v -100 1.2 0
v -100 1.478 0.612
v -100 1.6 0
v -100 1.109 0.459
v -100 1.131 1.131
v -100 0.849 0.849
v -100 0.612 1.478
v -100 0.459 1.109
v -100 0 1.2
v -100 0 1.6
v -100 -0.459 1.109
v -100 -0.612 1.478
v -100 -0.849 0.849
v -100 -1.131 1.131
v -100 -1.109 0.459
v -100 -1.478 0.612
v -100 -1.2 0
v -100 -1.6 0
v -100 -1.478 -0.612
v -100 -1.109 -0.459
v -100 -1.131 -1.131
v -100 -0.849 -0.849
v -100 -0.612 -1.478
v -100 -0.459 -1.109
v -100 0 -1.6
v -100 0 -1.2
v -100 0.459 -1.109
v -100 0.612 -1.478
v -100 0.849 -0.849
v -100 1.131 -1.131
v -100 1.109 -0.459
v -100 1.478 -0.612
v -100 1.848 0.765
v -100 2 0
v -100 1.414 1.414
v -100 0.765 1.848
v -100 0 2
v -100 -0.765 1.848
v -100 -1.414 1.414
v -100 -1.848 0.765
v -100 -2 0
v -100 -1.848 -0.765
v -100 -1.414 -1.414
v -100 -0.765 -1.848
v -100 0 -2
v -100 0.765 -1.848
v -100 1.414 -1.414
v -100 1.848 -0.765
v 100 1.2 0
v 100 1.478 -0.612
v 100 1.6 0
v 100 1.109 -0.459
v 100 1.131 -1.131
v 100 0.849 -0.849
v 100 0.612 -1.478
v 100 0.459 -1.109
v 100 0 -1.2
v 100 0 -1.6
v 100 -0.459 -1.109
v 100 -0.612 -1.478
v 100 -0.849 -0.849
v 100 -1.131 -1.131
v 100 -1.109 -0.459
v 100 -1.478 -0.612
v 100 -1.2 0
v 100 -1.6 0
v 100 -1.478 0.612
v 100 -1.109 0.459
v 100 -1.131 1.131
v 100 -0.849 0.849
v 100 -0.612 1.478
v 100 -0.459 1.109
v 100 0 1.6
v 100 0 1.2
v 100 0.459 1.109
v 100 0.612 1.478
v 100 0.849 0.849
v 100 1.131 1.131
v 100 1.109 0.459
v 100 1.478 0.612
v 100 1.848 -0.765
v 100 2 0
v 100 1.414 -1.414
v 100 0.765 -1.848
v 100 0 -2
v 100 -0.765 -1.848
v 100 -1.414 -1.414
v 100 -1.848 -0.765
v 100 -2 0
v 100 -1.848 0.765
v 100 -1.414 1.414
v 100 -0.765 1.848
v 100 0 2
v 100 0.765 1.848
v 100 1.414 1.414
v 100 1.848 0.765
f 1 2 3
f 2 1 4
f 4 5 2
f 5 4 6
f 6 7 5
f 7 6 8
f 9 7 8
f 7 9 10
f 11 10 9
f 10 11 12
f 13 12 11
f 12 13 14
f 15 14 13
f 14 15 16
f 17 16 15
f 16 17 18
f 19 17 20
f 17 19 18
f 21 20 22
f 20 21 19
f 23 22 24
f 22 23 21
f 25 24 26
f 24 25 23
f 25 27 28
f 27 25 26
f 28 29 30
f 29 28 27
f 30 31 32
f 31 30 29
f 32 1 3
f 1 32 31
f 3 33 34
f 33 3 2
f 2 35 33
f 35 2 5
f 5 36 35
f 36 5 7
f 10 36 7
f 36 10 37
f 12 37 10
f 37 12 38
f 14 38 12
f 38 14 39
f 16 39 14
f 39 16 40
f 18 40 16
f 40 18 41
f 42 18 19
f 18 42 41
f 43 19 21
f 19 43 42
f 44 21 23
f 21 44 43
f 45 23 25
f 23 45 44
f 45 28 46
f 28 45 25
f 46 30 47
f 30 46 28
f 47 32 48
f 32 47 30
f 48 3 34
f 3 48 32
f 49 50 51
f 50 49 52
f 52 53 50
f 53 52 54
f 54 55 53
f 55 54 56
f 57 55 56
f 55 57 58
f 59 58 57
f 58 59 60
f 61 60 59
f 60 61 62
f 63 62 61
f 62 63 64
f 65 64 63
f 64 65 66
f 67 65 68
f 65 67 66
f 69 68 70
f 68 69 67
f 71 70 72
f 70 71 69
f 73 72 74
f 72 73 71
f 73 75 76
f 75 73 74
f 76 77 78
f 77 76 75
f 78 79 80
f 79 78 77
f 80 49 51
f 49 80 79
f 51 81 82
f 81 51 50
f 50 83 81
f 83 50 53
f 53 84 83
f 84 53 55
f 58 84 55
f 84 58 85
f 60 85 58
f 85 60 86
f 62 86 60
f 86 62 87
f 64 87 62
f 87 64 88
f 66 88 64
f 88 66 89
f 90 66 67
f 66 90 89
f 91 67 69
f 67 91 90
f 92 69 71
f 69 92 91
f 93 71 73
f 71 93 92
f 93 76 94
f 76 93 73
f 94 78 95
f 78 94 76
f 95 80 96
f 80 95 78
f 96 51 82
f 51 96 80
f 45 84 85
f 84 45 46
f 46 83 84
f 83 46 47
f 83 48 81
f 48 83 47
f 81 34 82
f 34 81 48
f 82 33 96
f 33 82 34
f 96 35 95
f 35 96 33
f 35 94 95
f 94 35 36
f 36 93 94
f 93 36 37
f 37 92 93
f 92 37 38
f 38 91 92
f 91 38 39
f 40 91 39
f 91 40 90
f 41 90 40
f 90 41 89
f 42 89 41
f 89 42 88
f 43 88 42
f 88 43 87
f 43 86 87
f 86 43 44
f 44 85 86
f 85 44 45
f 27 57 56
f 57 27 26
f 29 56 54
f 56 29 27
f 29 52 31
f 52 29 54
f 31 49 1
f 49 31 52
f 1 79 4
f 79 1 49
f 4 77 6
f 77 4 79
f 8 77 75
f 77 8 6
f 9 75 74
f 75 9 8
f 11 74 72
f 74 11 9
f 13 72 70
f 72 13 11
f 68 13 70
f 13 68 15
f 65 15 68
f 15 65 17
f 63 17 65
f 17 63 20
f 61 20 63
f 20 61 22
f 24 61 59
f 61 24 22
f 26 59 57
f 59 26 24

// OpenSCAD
// file: ../p/4-4cyli.scad
use <../lib.scad>
function ldraw_lib__4_4cyli() = [
// 0 Cylinder 1.0
// 0 Name: 4-4cyli.dat
// 0 Author: James Jessiman
// 0 !LDRAW_ORG Primitive UPDATE 2005-01
// 0 !LICENSE Licensed under CC BY 4.0 : see CAreadme.txt
// 
// 0 BFC CERTIFY CCW
  [0,"BFC","CERTIFY"],
  [0,"BFC","CCW"],
// 
// 0 !HISTORY 1998-12-15 [PTadmin] Official Update 1998-10
// 0 !HISTORY 2002-03-23 [sbliss] Added BFC statement; merged headers from files in distributions LDraw 0.27 and Complete.
// 0 !HISTORY 2002-04-25 [PTadmin] Official Update 2002-02
// 0 !HISTORY 2004-12-14 [guyvivan] BFC CCW
// 0 !HISTORY 2005-12-28 [PTadmin] Official Update 2005-01
// 0 !HISTORY 2007-06-24 [PTadmin] Header formatted for Contributor Agreement
// 0 !HISTORY 2008-07-01 [PTadmin] Official Update 2008-01
// 
// 
// 4 16 1 1 0 0.9239 1 0.3827 0.9239 0 0.3827 1 0 0
  [4,16,1,1,0,0.9239,1,0.3827,0.9239,0,0.3827,1,0,0],
// 5 24 1 0 0 1 1 0 0.9239 0 0.3827 0.9239 0 -0.3827
  [5,24,1,0,0,1,1,0,0.9239,0,0.3827,0.9239,0,-0.3827],
// 4 16 0.9239 1 0.3827 0.7071 1 0.7071 0.7071 0 0.7071 0.9239 0 0.3827
  [4,16,0.9239,1,0.3827,0.7071,1,0.7071,0.7071,0,0.7071,0.9239,0,0.3827],
// 5 24 0.9239 0 0.3827 0.9239 1 0.3827 0.7071 0 0.7071 1 0 0
  [5,24,0.9239,0,0.3827,0.9239,1,0.3827,0.7071,0,0.7071,1,0,0],
// 4 16 0.7071 1 0.7071 0.3827 1 0.9239 0.3827 0 0.9239 0.7071 0 0.7071
  [4,16,0.7071,1,0.7071,0.3827,1,0.9239,0.3827,0,0.9239,0.7071,0,0.7071],
// 5 24 0.7071 0 0.7071 0.7071 1 0.7071 0.3827 0 0.9239 0.9239 0 0.3827
  [5,24,0.7071,0,0.7071,0.7071,1,0.7071,0.3827,0,0.9239,0.9239,0,0.3827],
// 4 16 0.3827 1 0.9239 0 1 1 0 0 1 0.3827 0 0.9239
  [4,16,0.3827,1,0.9239,0,1,1,0,0,1,0.3827,0,0.9239],
// 5 24 0.3827 0 0.9239 0.3827 1 0.9239 0 0 1 0.7071 0 0.7071
  [5,24,0.3827,0,0.9239,0.3827,1,0.9239,0,0,1,0.7071,0,0.7071],
// 4 16 0 1 1 -0.3827 1 0.9239 -0.3827 0 0.9239 0 0 1
  [4,16,0,1,1,-0.3827,1,0.9239,-0.3827,0,0.9239,0,0,1],
// 5 24 0 0 1 0 1 1 -0.3827 0 0.9239 0.3827 0 0.9239
  [5,24,0,0,1,0,1,1,-0.3827,0,0.9239,0.3827,0,0.9239],
// 4 16 -0.3827 1 0.9239 -0.7071 1 0.7071 -0.7071 0 0.7071 -0.3827 0 0.9239
  [4,16,-0.3827,1,0.9239,-0.7071,1,0.7071,-0.7071,0,0.7071,-0.3827,0,0.9239],
// 5 24 -0.3827 0 0.9239 -0.3827 1 0.9239 -0.7071 0 0.7071 0 0 1
  [5,24,-0.3827,0,0.9239,-0.3827,1,0.9239,-0.7071,0,0.7071,0,0,1],
// 4 16 -0.7071 1 0.7071 -0.9239 1 0.3827 -0.9239 0 0.3827 -0.7071 0 0.7071
  [4,16,-0.7071,1,0.7071,-0.9239,1,0.3827,-0.9239,0,0.3827,-0.7071,0,0.7071],
// 5 24 -0.7071 0 0.7071 -0.7071 1 0.7071 -0.9239 0 0.3827 -0.3827 0 0.9239
  [5,24,-0.7071,0,0.7071,-0.7071,1,0.7071,-0.9239,0,0.3827,-0.3827,0,0.9239],
// 4 16 -0.9239 1 0.3827 -1 1 0 -1 0 0 -0.9239 0 0.3827
  [4,16,-0.9239,1,0.3827,-1,1,0,-1,0,0,-0.9239,0,0.3827],
// 5 24 -0.9239 0 0.3827 -0.9239 1 0.3827 -1 0 0 -0.7071 0 0.7071
  [5,24,-0.9239,0,0.3827,-0.9239,1,0.3827,-1,0,0,-0.7071,0,0.7071],
// 4 16 -1 1 0 -0.9239 1 -0.3827 -0.9239 0 -0.3827 -1 0 0
  [4,16,-1,1,0,-0.9239,1,-0.3827,-0.9239,0,-0.3827,-1,0,0],
// 5 24 -1 0 0 -1 1 0 -0.9239 0 -0.3827 -0.9239 0 0.3827
  [5,24,-1,0,0,-1,1,0,-0.9239,0,-0.3827,-0.9239,0,0.3827],
// 4 16 -0.9239 1 -0.3827 -0.7071 1 -0.7071 -0.7071 0 -0.7071 -0.9239 0 -0.3827
  [4,16,-0.9239,1,-0.3827,-0.7071,1,-0.7071,-0.7071,0,-0.7071,-0.9239,0,-0.3827],
// 5 24 -0.9239 0 -0.3827 -0.9239 1 -0.3827 -0.7071 0 -0.7071 -1 0 0
  [5,24,-0.9239,0,-0.3827,-0.9239,1,-0.3827,-0.7071,0,-0.7071,-1,0,0],
// 4 16 -0.7071 1 -0.7071 -0.3827 1 -0.9239 -0.3827 0 -0.9239 -0.7071 0 -0.7071
  [4,16,-0.7071,1,-0.7071,-0.3827,1,-0.9239,-0.3827,0,-0.9239,-0.7071,0,-0.7071],
// 5 24 -0.7071 0 -0.7071 -0.7071 1 -0.7071 -0.3827 0 -0.9239 -0.9239 0 -0.3827
  [5,24,-0.7071,0,-0.7071,-0.7071,1,-0.7071,-0.3827,0,-0.9239,-0.9239,0,-0.3827],
// 4 16 -0.3827 1 -0.9239 0 1 -1 0 0 -1 -0.3827 0 -0.9239
  [4,16,-0.3827,1,-0.9239,0,1,-1,0,0,-1,-0.3827,0,-0.9239],
// 5 24 -0.3827 0 -0.9239 -0.3827 1 -0.9239 0 0 -1 -0.7071 0 -0.7071
  [5,24,-0.3827,0,-0.9239,-0.3827,1,-0.9239,0,0,-1,-0.7071,0,-0.7071],
// 4 16 0 1 -1 0.3827 1 -0.9239 0.3827 0 -0.9239 0 0 -1
  [4,16,0,1,-1,0.3827,1,-0.9239,0.3827,0,-0.9239,0,0,-1],
// 5 24 0 0 -1 0 1 -1 0.3827 0 -0.9239 -0.3827 0 -0.9239
  [5,24,0,0,-1,0,1,-1,0.3827,0,-0.9239,-0.3827,0,-0.9239],
// 4 16 0.3827 1 -0.9239 0.7071 1 -0.7071 0.7071 0 -0.7071 0.3827 0 -0.9239
  [4,16,0.3827,1,-0.9239,0.7071,1,-0.7071,0.7071,0,-0.7071,0.3827,0,-0.9239],
// 5 24 0.3827 0 -0.9239 0.3827 1 -0.9239 0.7071 0 -0.7071 0 0 -1
  [5,24,0.3827,0,-0.9239,0.3827,1,-0.9239,0.7071,0,-0.7071,0,0,-1],
// 4 16 0.7071 1 -0.7071 0.9239 1 -0.3827 0.9239 0 -0.3827 0.7071 0 -0.7071
  [4,16,0.7071,1,-0.7071,0.9239,1,-0.3827,0.9239,0,-0.3827,0.7071,0,-0.7071],
// 5 24 0.7071 0 -0.7071 0.7071 1 -0.7071 0.9239 0 -0.3827 0.3827 0 -0.9239
  [5,24,0.7071,0,-0.7071,0.7071,1,-0.7071,0.9239,0,-0.3827,0.3827,0,-0.9239],
// 4 16 0.9239 1 -0.3827 1 1 0 1 0 0 0.9239 0 -0.3827
  [4,16,0.9239,1,-0.3827,1,1,0,1,0,0,0.9239,0,-0.3827],
// 5 24 0.9239 0 -0.3827 0.9239 1 -0.3827 1 0 0 0.7071 0 -0.7071
  [5,24,0.9239,0,-0.3827,0.9239,1,-0.3827,1,0,0,0.7071,0,-0.7071],
// 0
];
module ldraw_lib__4_4cyli(step=0, col=false, unit=2/5, alt=false, line=0.2, solid=!$preview)
    makepoly(ldraw_lib__4_4cyli(), step=step, col=col, unit=unit, alt=alt, line=line, solid=solid);
ldraw_lib__4_4cyli(line=0.2);
// file: ../p/4-4ring4.scad
use <../lib.scad>
function ldraw_lib__4_4ring4() = [
// 0 Ring  4 x 1.0
// 0 Name: 4-4ring4.dat
// 0 Author: James Jessiman
// 0 !LDRAW_ORG Primitive UPDATE 2009-01
// 0 !LICENSE Licensed under CC BY 4.0 : see CAreadme.txt
// 
// 0 BFC CERTIFY CCW
  [0,"BFC","CERTIFY"],
  [0,"BFC","CCW"],
// 
// 0 !HISTORY 1998-12-15 [PTadmin] Official Update 1998-10
// 0 !HISTORY 2002-04-08 [BrickCaster] Modified for BFC compliance
// 0 !HISTORY 2002-04-25 [PTadmin] Official Update 2002-02
// 0 !HISTORY 2007-06-24 [PTadmin] Header formatted for Contributor Agreement
// 0 !HISTORY 2008-07-01 [PTadmin] Official Update 2008-01
// 0 !HISTORY 2008-08-26 [cwdee] Switch polygon winding and rename
// 0 !HISTORY 2009-05-02 [PTadmin] Official Update 2009-01
// 
// 
// 4 16 -1.9135 0 4.6195 -1.5308 0 3.6956 0 0 4 0 0 5
  [4,16,-1.9135,0,4.6195,-1.5308,0,3.6956,0,0,4,0,0,5],
// 4 16 -3.5355 0 3.5355 -2.8284 0 2.8284 -1.5308 0 3.6956 -1.9135 0 4.6195
  [4,16,-3.5355,0,3.5355,-2.8284,0,2.8284,-1.5308,0,3.6956,-1.9135,0,4.6195],
// 4 16 -4.6195 0 1.9135 -3.6956 0 1.5308 -2.8284 0 2.8284 -3.5355 0 3.5355
  [4,16,-4.6195,0,1.9135,-3.6956,0,1.5308,-2.8284,0,2.8284,-3.5355,0,3.5355],
// 4 16 -5 0 0 -4 0 0 -3.6956 0 1.5308 -4.6195 0 1.9135
  [4,16,-5,0,0,-4,0,0,-3.6956,0,1.5308,-4.6195,0,1.9135],
// 4 16 -4.6195 0 -1.9135 -3.6956 0 -1.5308 -4 0 0 -5 0 0
  [4,16,-4.6195,0,-1.9135,-3.6956,0,-1.5308,-4,0,0,-5,0,0],
// 4 16 -3.5355 0 -3.5355 -2.8284 0 -2.8284 -3.6956 0 -1.5308 -4.6195 0 -1.9135
  [4,16,-3.5355,0,-3.5355,-2.8284,0,-2.8284,-3.6956,0,-1.5308,-4.6195,0,-1.9135],
// 4 16 -1.9135 0 -4.6195 -1.5308 0 -3.6956 -2.8284 0 -2.8284 -3.5355 0 -3.5355
  [4,16,-1.9135,0,-4.6195,-1.5308,0,-3.6956,-2.8284,0,-2.8284,-3.5355,0,-3.5355],
// 4 16 0 0 -5 0 0 -4 -1.5308 0 -3.6956 -1.9135 0 -4.6195
  [4,16,0,0,-5,0,0,-4,-1.5308,0,-3.6956,-1.9135,0,-4.6195],
// 4 16 1.9135 0 -4.6195 1.5308 0 -3.6956 0 0 -4 0 0 -5
  [4,16,1.9135,0,-4.6195,1.5308,0,-3.6956,0,0,-4,0,0,-5],
// 4 16 3.5355 0 -3.5355 2.8284 0 -2.8284 1.5308 0 -3.6956 1.9135 0 -4.6195
  [4,16,3.5355,0,-3.5355,2.8284,0,-2.8284,1.5308,0,-3.6956,1.9135,0,-4.6195],
// 4 16 4.6195 0 -1.9135 3.6956 0 -1.5308 2.8284 0 -2.8284 3.5355 0 -3.5355
  [4,16,4.6195,0,-1.9135,3.6956,0,-1.5308,2.8284,0,-2.8284,3.5355,0,-3.5355],
// 4 16 5 0 0 4 0 0 3.6956 0 -1.5308 4.6195 0 -1.9135
  [4,16,5,0,0,4,0,0,3.6956,0,-1.5308,4.6195,0,-1.9135],
// 4 16 4.6195 0 1.9135 3.6956 0 1.5308 4 0 0 5 0 0
  [4,16,4.6195,0,1.9135,3.6956,0,1.5308,4,0,0,5,0,0],
// 4 16 3.5355 0 3.5355 2.8284 0 2.8284 3.6956 0 1.5308 4.6195 0 1.9135
  [4,16,3.5355,0,3.5355,2.8284,0,2.8284,3.6956,0,1.5308,4.6195,0,1.9135],
// 4 16 1.9135 0 4.6195 1.5308 0 3.6956 2.8284 0 2.8284 3.5355 0 3.5355
  [4,16,1.9135,0,4.6195,1.5308,0,3.6956,2.8284,0,2.8284,3.5355,0,3.5355],
// 4 16 0 0 5 0 0 4 1.5308 0 3.6956 1.9135 0 4.6195
  [4,16,0,0,5,0,0,4,1.5308,0,3.6956,1.9135,0,4.6195],
// 0
];
module ldraw_lib__4_4ring4(step=0, col=false, unit=2/5, alt=false, line=0.2, solid=!$preview)
    makepoly(ldraw_lib__4_4ring4(), step=step, col=col, unit=unit, alt=alt, line=line, solid=solid);
ldraw_lib__4_4ring4(line=0.2);
// file: ../p/4-4ring3.scad
use <../lib.scad>
function ldraw_lib__4_4ring3() = [
// 0 Ring  3 x 1.0
// 0 Name: 4-4ring3.dat
// 0 Author: James Jessiman
// 0 !LDRAW_ORG Primitive UPDATE 2009-01
// 0 !LICENSE Licensed under CC BY 4.0 : see CAreadme.txt
// 
// 0 BFC CERTIFY CCW
  [0,"BFC","CERTIFY"],
  [0,"BFC","CCW"],
// 
// 0 !HISTORY 1998-12-15 [PTadmin] Official Update 1998-10
// 0 !HISTORY 2002-04-05 [hafhead] Added BFC statement
// 0 !HISTORY 2002-04-25 [PTadmin] Official Update 2002-02
// 0 !HISTORY 2007-06-24 [PTadmin] Header formatted for Contributor Agreement
// 0 !HISTORY 2008-07-01 [PTadmin] Official Update 2008-01
// 0 !HISTORY 2008-08-26 [cwdee] Switch polygon winding and rename
// 0 !HISTORY 2009-05-02 [PTadmin] Official Update 2009-01
// 
// 
// 4 16 -1.5308 0 3.6956 -1.1481 0 2.7717 0 0 3 0 0 4
  [4,16,-1.5308,0,3.6956,-1.1481,0,2.7717,0,0,3,0,0,4],
// 4 16 -2.8284 0 2.8284 -2.1213 0 2.1213 -1.1481 0 2.7717 -1.5308 0 3.6956
  [4,16,-2.8284,0,2.8284,-2.1213,0,2.1213,-1.1481,0,2.7717,-1.5308,0,3.6956],
// 4 16 -3.6956 0 1.5308 -2.7717 0 1.1481 -2.1213 0 2.1213 -2.8284 0 2.8284
  [4,16,-3.6956,0,1.5308,-2.7717,0,1.1481,-2.1213,0,2.1213,-2.8284,0,2.8284],
// 4 16 -4 0 0 -3 0 0 -2.7717 0 1.1481 -3.6956 0 1.5308
  [4,16,-4,0,0,-3,0,0,-2.7717,0,1.1481,-3.6956,0,1.5308],
// 4 16 -3.6956 0 -1.5308 -2.7717 0 -1.1481 -3 0 0 -4 0 0
  [4,16,-3.6956,0,-1.5308,-2.7717,0,-1.1481,-3,0,0,-4,0,0],
// 4 16 -2.8284 0 -2.8284 -2.1213 0 -2.1213 -2.7717 0 -1.1481 -3.6956 0 -1.5308
  [4,16,-2.8284,0,-2.8284,-2.1213,0,-2.1213,-2.7717,0,-1.1481,-3.6956,0,-1.5308],
// 4 16 -1.5308 0 -3.6956 -1.1481 0 -2.7717 -2.1213 0 -2.1213 -2.8284 0 -2.8284
  [4,16,-1.5308,0,-3.6956,-1.1481,0,-2.7717,-2.1213,0,-2.1213,-2.8284,0,-2.8284],
// 4 16 0 0 -4 0 0 -3 -1.1481 0 -2.7717 -1.5308 0 -3.6956
  [4,16,0,0,-4,0,0,-3,-1.1481,0,-2.7717,-1.5308,0,-3.6956],
// 4 16 1.5308 0 -3.6956 1.1481 0 -2.7717 0 0 -3 0 0 -4
  [4,16,1.5308,0,-3.6956,1.1481,0,-2.7717,0,0,-3,0,0,-4],
// 4 16 2.8284 0 -2.8284 2.1213 0 -2.1213 1.1481 0 -2.7717 1.5308 0 -3.6956
  [4,16,2.8284,0,-2.8284,2.1213,0,-2.1213,1.1481,0,-2.7717,1.5308,0,-3.6956],
// 4 16 3.6956 0 -1.5308 2.7717 0 -1.1481 2.1213 0 -2.1213 2.8284 0 -2.8284
  [4,16,3.6956,0,-1.5308,2.7717,0,-1.1481,2.1213,0,-2.1213,2.8284,0,-2.8284],
// 4 16 4 0 0 3 0 0 2.7717 0 -1.1481 3.6956 0 -1.5308
  [4,16,4,0,0,3,0,0,2.7717,0,-1.1481,3.6956,0,-1.5308],
// 4 16 3.6956 0 1.5308 2.7717 0 1.1481 3 0 0 4 0 0
  [4,16,3.6956,0,1.5308,2.7717,0,1.1481,3,0,0,4,0,0],
// 4 16 2.8284 0 2.8284 2.1213 0 2.1213 2.7717 0 1.1481 3.6956 0 1.5308
  [4,16,2.8284,0,2.8284,2.1213,0,2.1213,2.7717,0,1.1481,3.6956,0,1.5308],
// 4 16 1.5308 0 3.6956 1.1481 0 2.7717 2.1213 0 2.1213 2.8284 0 2.8284
  [4,16,1.5308,0,3.6956,1.1481,0,2.7717,2.1213,0,2.1213,2.8284,0,2.8284],
// 4 16 0 0 4 0 0 3 1.1481 0 2.7717 1.5308 0 3.6956
  [4,16,0,0,4,0,0,3,1.1481,0,2.7717,1.5308,0,3.6956],
// 0
];
module ldraw_lib__4_4ring3(step=0, col=false, unit=2/5, alt=false, line=0.2, solid=!$preview)
    makepoly(ldraw_lib__4_4ring3(), step=step, col=col, unit=unit, alt=alt, line=line, solid=solid);
ldraw_lib__4_4ring3(line=0.2);
// file: ../p/4-4edge.scad
use <../lib.scad>
function ldraw_lib__4_4edge() = [
// 0 Circle 1.0
// 0 Name: 4-4edge.dat
// 0 Author: James Jessiman
// 0 !LDRAW_ORG Primitive UPDATE 2017-01
// 0 !LICENSE Licensed under CC BY 4.0 : see CAreadme.txt
// 
// 0 BFC CERTIFY CCW
  [0,"BFC","CERTIFY"],
  [0,"BFC","CCW"],
// 
// 0 !HISTORY 1998-12-15 [PTadmin] Official Update 1998-10
// 0 !HISTORY 2005-12-28 [PTadmin] Official Update 2005-01
// 0 !HISTORY 2007-06-24 [PTadmin] Header formatted for Contributor Agreement
// 0 !HISTORY 2008-07-01 [PTadmin] Official Update 2008-01
// 0 !HISTORY 2017-01-15 [Steffen] BFCed
// 0 !HISTORY 2017-12-30 [PTadmin] Official Update 2017-01
// 
// 
// 2 24 1 0 0 0.9239 0 0.3827
  [2,24,1,0,0,0.9239,0,0.3827],
// 2 24 0.9239 0 0.3827 0.7071 0 0.7071
  [2,24,0.9239,0,0.3827,0.7071,0,0.7071],
// 2 24 0.7071 0 0.7071 0.3827 0 0.9239
  [2,24,0.7071,0,0.7071,0.3827,0,0.9239],
// 2 24 0.3827 0 0.9239 0 0 1
  [2,24,0.3827,0,0.9239,0,0,1],
// 2 24 0 0 1 -0.3827 0 0.9239
  [2,24,0,0,1,-0.3827,0,0.9239],
// 2 24 -0.3827 0 0.9239 -0.7071 0 0.7071
  [2,24,-0.3827,0,0.9239,-0.7071,0,0.7071],
// 2 24 -0.7071 0 0.7071 -0.9239 0 0.3827
  [2,24,-0.7071,0,0.7071,-0.9239,0,0.3827],
// 2 24 -0.9239 0 0.3827 -1 0 -0
  [2,24,-0.9239,0,0.3827,-1,0,-0],
// 2 24 -1 0 -0 -0.9239 0 -0.3827
  [2,24,-1,0,-0,-0.9239,0,-0.3827],
// 2 24 -0.9239 0 -0.3827 -0.7071 0 -0.7071
  [2,24,-0.9239,0,-0.3827,-0.7071,0,-0.7071],
// 2 24 -0.7071 0 -0.7071 -0.3827 0 -0.9239
  [2,24,-0.7071,0,-0.7071,-0.3827,0,-0.9239],
// 2 24 -0.3827 0 -0.9239 0 0 -1
  [2,24,-0.3827,0,-0.9239,0,0,-1],
// 2 24 0 0 -1 0.3827 0 -0.9239
  [2,24,0,0,-1,0.3827,0,-0.9239],
// 2 24 0.3827 0 -0.9239 0.7071 0 -0.7071
  [2,24,0.3827,0,-0.9239,0.7071,0,-0.7071],
// 2 24 0.7071 0 -0.7071 0.9239 0 -0.3827
  [2,24,0.7071,0,-0.7071,0.9239,0,-0.3827],
// 2 24 0.9239 0 -0.3827 1 0 0
  [2,24,0.9239,0,-0.3827,1,0,0],
];
module ldraw_lib__4_4edge(step=0, col=false, unit=2/5, alt=false, line=0.2, solid=!$preview)
    makepoly(ldraw_lib__4_4edge(), step=step, col=col, unit=unit, alt=alt, line=line, solid=solid);
ldraw_lib__4_4edge(line=0.2);
// file: 71533k03.scad
use <../lib.scad>
use <../p/4-4cyli.scad>
function ldraw_lib__71533k03() = [
// 0 ~Technic Pneumatic Tube Segment
// 0 Name: 71533k03.dat
// 0 Author: Jaco van der Molen [Jaco]
// 0 !LDRAW_ORG Part Flexible_Section UPDATE 2020-01
// 0 !LICENSE Licensed under CC BY 4.0 : see CAreadme.txt
// 
// 0 BFC CERTIFY CW
  [0,"BFC","CERTIFY"],
  [0,"BFC","CW"],
// 
// 0 !HISTORY 2003-11-30 [Steffen] BFCed
// 0 !HISTORY 2009-12-29 [PTadmin] Official Update 2009-03
// 0 !HISTORY 2020-06-27 [PTadmin] Renamed from 166
// 0 !HISTORY 2020-06-28 [PTadmin] Official Update 2020-01
// 
// 
// 1 16 0 0 0 5 0 0 0 1 0 0 0 5 4-4cyli.dat
  [1,16,0,0,0,5,0,0,0,1,0,0,0,5, ldraw_lib__4_4cyli()],
// 0 BFC INVERTNEXT
  [0,"BFC","INVERTNEXT"],
// 1 16 0 0 0 3 0 0 0 1 0 0 0 3 4-4cyli.dat
  [1,16,0,0,0,3,0,0,0,1,0,0,0,3, ldraw_lib__4_4cyli()],
// 0
];
module ldraw_lib__71533k03(step=0, col=false, unit=2/5, alt=false, line=0.2, solid=!$preview)
    makepoly(ldraw_lib__71533k03(), step=step, col=col, unit=unit, alt=alt, line=line, solid=solid);
ldraw_lib__71533k03(line=0.2);
// file: 71533k02.scad
use <../lib.scad>
use <../p/4-4edge.scad>
use <../p/4-4ring3.scad>
use <../p/4-4ring4.scad>
function ldraw_lib__71533k02() = [
// 0 ~Technic Pneumatic Tube End (Non-Bulged)
// 0 Name: 71533k02.dat
// 0 Author: Steffen [Steffen]
// 0 !LDRAW_ORG Part Flexible_Section UPDATE 2020-01
// 0 !LICENSE Licensed under CC BY 4.0 : see CAreadme.txt
// 
// 0 BFC CERTIFY CCW
  [0,"BFC","CERTIFY"],
  [0,"BFC","CCW"],
// 
// 0 !HISTORY 2020-06-28 [PTadmin] Official Update 2020-01
// 
// 
// 0 // This file goes together with 71533k01.dat and 71533k03.dat.
// 0 // Those 3 files can be used to create Technic Pneumatic Tubes
// 0 // with either bulged or non-bulged ends.
// 
// 1 16 0 0 0 1 0 0 0 1 0 0 0 1 4-4ring3.dat
  [1,16,0,0,0,1,0,0,0,1,0,0,0,1, ldraw_lib__4_4ring3()],
// 1 16 0 0 0 1 0 0 0 1 0 0 0 1 4-4ring4.dat
  [1,16,0,0,0,1,0,0,0,1,0,0,0,1, ldraw_lib__4_4ring4()],
// 1 16 0 0 0 3 0 0 0 3 0 0 0 3 4-4edge.dat
  [1,16,0,0,0,3,0,0,0,3,0,0,0,3, ldraw_lib__4_4edge()],
// 1 16 0 0 0 5 0 0 0 5 0 0 0 5 4-4edge.dat
  [1,16,0,0,0,5,0,0,0,5,0,0,0,5, ldraw_lib__4_4edge()],
];
module ldraw_lib__71533k02(step=0, col=false, unit=2/5, alt=false, line=0.2, solid=!$preview)
    makepoly(ldraw_lib__71533k02(), step=step, col=col, unit=unit, alt=alt, line=line, solid=solid);
ldraw_lib__71533k02(line=0.2);
// main file
use <../lib.scad>
use <71533k02.scad>
use <71533k03.scad>
function ldraw_lib__67678_f1() = [
// 0 Technic Pneumatic Tube 25L
// 0 Name: 67678-f1.dat
// 0 Author: Johann Eisner [technicbasics]
// 0 !LDRAW_ORG Part UPDATE 2025-05
// 0 !LICENSE Licensed under CC BY 4.0 : see CAreadme.txt
// 
// 0 BFC CERTIFY CCW
  [0,"BFC","CERTIFY"],
  [0,"BFC","CCW"],
// 
// 0 !KEYWORDS 200 mm, BrickLink 5102c25, Rebrickable 5102c25
// 
// 0 !HISTORY 2025-05-28 [OrionP] Official Update 2025-05
// 
// 1 16 -250 0 0 0 1 0 1 0 0 0 0 1 71533k02.dat
  [1,16,-250,0,0,0,1,0,1,0,0,0,0,1, ldraw_lib__71533k02()],
// 1 16 250 0 0 0 -1 0 -1 0 0 0 0 1 71533k02.dat
  [1,16,250,0,0,0,-1,0,-1,0,0,0,0,1, ldraw_lib__71533k02()],
// 1 16 -250 0 0 0 500 0 1 0 0 0 0 1 71533k03.dat
  [1,16,-250,0,0,0,500,0,1,0,0,0,0,1, ldraw_lib__71533k03()],
];
module ldraw_lib__67678_f1(step=0, col=false, unit=2/5, alt=false, line=0.2, solid=!$preview)
    makepoly(ldraw_lib__67678_f1(), step=step, col=col, unit=unit, alt=alt, line=line, solid=solid);
ldraw_lib__67678_f1(line=0.2);
